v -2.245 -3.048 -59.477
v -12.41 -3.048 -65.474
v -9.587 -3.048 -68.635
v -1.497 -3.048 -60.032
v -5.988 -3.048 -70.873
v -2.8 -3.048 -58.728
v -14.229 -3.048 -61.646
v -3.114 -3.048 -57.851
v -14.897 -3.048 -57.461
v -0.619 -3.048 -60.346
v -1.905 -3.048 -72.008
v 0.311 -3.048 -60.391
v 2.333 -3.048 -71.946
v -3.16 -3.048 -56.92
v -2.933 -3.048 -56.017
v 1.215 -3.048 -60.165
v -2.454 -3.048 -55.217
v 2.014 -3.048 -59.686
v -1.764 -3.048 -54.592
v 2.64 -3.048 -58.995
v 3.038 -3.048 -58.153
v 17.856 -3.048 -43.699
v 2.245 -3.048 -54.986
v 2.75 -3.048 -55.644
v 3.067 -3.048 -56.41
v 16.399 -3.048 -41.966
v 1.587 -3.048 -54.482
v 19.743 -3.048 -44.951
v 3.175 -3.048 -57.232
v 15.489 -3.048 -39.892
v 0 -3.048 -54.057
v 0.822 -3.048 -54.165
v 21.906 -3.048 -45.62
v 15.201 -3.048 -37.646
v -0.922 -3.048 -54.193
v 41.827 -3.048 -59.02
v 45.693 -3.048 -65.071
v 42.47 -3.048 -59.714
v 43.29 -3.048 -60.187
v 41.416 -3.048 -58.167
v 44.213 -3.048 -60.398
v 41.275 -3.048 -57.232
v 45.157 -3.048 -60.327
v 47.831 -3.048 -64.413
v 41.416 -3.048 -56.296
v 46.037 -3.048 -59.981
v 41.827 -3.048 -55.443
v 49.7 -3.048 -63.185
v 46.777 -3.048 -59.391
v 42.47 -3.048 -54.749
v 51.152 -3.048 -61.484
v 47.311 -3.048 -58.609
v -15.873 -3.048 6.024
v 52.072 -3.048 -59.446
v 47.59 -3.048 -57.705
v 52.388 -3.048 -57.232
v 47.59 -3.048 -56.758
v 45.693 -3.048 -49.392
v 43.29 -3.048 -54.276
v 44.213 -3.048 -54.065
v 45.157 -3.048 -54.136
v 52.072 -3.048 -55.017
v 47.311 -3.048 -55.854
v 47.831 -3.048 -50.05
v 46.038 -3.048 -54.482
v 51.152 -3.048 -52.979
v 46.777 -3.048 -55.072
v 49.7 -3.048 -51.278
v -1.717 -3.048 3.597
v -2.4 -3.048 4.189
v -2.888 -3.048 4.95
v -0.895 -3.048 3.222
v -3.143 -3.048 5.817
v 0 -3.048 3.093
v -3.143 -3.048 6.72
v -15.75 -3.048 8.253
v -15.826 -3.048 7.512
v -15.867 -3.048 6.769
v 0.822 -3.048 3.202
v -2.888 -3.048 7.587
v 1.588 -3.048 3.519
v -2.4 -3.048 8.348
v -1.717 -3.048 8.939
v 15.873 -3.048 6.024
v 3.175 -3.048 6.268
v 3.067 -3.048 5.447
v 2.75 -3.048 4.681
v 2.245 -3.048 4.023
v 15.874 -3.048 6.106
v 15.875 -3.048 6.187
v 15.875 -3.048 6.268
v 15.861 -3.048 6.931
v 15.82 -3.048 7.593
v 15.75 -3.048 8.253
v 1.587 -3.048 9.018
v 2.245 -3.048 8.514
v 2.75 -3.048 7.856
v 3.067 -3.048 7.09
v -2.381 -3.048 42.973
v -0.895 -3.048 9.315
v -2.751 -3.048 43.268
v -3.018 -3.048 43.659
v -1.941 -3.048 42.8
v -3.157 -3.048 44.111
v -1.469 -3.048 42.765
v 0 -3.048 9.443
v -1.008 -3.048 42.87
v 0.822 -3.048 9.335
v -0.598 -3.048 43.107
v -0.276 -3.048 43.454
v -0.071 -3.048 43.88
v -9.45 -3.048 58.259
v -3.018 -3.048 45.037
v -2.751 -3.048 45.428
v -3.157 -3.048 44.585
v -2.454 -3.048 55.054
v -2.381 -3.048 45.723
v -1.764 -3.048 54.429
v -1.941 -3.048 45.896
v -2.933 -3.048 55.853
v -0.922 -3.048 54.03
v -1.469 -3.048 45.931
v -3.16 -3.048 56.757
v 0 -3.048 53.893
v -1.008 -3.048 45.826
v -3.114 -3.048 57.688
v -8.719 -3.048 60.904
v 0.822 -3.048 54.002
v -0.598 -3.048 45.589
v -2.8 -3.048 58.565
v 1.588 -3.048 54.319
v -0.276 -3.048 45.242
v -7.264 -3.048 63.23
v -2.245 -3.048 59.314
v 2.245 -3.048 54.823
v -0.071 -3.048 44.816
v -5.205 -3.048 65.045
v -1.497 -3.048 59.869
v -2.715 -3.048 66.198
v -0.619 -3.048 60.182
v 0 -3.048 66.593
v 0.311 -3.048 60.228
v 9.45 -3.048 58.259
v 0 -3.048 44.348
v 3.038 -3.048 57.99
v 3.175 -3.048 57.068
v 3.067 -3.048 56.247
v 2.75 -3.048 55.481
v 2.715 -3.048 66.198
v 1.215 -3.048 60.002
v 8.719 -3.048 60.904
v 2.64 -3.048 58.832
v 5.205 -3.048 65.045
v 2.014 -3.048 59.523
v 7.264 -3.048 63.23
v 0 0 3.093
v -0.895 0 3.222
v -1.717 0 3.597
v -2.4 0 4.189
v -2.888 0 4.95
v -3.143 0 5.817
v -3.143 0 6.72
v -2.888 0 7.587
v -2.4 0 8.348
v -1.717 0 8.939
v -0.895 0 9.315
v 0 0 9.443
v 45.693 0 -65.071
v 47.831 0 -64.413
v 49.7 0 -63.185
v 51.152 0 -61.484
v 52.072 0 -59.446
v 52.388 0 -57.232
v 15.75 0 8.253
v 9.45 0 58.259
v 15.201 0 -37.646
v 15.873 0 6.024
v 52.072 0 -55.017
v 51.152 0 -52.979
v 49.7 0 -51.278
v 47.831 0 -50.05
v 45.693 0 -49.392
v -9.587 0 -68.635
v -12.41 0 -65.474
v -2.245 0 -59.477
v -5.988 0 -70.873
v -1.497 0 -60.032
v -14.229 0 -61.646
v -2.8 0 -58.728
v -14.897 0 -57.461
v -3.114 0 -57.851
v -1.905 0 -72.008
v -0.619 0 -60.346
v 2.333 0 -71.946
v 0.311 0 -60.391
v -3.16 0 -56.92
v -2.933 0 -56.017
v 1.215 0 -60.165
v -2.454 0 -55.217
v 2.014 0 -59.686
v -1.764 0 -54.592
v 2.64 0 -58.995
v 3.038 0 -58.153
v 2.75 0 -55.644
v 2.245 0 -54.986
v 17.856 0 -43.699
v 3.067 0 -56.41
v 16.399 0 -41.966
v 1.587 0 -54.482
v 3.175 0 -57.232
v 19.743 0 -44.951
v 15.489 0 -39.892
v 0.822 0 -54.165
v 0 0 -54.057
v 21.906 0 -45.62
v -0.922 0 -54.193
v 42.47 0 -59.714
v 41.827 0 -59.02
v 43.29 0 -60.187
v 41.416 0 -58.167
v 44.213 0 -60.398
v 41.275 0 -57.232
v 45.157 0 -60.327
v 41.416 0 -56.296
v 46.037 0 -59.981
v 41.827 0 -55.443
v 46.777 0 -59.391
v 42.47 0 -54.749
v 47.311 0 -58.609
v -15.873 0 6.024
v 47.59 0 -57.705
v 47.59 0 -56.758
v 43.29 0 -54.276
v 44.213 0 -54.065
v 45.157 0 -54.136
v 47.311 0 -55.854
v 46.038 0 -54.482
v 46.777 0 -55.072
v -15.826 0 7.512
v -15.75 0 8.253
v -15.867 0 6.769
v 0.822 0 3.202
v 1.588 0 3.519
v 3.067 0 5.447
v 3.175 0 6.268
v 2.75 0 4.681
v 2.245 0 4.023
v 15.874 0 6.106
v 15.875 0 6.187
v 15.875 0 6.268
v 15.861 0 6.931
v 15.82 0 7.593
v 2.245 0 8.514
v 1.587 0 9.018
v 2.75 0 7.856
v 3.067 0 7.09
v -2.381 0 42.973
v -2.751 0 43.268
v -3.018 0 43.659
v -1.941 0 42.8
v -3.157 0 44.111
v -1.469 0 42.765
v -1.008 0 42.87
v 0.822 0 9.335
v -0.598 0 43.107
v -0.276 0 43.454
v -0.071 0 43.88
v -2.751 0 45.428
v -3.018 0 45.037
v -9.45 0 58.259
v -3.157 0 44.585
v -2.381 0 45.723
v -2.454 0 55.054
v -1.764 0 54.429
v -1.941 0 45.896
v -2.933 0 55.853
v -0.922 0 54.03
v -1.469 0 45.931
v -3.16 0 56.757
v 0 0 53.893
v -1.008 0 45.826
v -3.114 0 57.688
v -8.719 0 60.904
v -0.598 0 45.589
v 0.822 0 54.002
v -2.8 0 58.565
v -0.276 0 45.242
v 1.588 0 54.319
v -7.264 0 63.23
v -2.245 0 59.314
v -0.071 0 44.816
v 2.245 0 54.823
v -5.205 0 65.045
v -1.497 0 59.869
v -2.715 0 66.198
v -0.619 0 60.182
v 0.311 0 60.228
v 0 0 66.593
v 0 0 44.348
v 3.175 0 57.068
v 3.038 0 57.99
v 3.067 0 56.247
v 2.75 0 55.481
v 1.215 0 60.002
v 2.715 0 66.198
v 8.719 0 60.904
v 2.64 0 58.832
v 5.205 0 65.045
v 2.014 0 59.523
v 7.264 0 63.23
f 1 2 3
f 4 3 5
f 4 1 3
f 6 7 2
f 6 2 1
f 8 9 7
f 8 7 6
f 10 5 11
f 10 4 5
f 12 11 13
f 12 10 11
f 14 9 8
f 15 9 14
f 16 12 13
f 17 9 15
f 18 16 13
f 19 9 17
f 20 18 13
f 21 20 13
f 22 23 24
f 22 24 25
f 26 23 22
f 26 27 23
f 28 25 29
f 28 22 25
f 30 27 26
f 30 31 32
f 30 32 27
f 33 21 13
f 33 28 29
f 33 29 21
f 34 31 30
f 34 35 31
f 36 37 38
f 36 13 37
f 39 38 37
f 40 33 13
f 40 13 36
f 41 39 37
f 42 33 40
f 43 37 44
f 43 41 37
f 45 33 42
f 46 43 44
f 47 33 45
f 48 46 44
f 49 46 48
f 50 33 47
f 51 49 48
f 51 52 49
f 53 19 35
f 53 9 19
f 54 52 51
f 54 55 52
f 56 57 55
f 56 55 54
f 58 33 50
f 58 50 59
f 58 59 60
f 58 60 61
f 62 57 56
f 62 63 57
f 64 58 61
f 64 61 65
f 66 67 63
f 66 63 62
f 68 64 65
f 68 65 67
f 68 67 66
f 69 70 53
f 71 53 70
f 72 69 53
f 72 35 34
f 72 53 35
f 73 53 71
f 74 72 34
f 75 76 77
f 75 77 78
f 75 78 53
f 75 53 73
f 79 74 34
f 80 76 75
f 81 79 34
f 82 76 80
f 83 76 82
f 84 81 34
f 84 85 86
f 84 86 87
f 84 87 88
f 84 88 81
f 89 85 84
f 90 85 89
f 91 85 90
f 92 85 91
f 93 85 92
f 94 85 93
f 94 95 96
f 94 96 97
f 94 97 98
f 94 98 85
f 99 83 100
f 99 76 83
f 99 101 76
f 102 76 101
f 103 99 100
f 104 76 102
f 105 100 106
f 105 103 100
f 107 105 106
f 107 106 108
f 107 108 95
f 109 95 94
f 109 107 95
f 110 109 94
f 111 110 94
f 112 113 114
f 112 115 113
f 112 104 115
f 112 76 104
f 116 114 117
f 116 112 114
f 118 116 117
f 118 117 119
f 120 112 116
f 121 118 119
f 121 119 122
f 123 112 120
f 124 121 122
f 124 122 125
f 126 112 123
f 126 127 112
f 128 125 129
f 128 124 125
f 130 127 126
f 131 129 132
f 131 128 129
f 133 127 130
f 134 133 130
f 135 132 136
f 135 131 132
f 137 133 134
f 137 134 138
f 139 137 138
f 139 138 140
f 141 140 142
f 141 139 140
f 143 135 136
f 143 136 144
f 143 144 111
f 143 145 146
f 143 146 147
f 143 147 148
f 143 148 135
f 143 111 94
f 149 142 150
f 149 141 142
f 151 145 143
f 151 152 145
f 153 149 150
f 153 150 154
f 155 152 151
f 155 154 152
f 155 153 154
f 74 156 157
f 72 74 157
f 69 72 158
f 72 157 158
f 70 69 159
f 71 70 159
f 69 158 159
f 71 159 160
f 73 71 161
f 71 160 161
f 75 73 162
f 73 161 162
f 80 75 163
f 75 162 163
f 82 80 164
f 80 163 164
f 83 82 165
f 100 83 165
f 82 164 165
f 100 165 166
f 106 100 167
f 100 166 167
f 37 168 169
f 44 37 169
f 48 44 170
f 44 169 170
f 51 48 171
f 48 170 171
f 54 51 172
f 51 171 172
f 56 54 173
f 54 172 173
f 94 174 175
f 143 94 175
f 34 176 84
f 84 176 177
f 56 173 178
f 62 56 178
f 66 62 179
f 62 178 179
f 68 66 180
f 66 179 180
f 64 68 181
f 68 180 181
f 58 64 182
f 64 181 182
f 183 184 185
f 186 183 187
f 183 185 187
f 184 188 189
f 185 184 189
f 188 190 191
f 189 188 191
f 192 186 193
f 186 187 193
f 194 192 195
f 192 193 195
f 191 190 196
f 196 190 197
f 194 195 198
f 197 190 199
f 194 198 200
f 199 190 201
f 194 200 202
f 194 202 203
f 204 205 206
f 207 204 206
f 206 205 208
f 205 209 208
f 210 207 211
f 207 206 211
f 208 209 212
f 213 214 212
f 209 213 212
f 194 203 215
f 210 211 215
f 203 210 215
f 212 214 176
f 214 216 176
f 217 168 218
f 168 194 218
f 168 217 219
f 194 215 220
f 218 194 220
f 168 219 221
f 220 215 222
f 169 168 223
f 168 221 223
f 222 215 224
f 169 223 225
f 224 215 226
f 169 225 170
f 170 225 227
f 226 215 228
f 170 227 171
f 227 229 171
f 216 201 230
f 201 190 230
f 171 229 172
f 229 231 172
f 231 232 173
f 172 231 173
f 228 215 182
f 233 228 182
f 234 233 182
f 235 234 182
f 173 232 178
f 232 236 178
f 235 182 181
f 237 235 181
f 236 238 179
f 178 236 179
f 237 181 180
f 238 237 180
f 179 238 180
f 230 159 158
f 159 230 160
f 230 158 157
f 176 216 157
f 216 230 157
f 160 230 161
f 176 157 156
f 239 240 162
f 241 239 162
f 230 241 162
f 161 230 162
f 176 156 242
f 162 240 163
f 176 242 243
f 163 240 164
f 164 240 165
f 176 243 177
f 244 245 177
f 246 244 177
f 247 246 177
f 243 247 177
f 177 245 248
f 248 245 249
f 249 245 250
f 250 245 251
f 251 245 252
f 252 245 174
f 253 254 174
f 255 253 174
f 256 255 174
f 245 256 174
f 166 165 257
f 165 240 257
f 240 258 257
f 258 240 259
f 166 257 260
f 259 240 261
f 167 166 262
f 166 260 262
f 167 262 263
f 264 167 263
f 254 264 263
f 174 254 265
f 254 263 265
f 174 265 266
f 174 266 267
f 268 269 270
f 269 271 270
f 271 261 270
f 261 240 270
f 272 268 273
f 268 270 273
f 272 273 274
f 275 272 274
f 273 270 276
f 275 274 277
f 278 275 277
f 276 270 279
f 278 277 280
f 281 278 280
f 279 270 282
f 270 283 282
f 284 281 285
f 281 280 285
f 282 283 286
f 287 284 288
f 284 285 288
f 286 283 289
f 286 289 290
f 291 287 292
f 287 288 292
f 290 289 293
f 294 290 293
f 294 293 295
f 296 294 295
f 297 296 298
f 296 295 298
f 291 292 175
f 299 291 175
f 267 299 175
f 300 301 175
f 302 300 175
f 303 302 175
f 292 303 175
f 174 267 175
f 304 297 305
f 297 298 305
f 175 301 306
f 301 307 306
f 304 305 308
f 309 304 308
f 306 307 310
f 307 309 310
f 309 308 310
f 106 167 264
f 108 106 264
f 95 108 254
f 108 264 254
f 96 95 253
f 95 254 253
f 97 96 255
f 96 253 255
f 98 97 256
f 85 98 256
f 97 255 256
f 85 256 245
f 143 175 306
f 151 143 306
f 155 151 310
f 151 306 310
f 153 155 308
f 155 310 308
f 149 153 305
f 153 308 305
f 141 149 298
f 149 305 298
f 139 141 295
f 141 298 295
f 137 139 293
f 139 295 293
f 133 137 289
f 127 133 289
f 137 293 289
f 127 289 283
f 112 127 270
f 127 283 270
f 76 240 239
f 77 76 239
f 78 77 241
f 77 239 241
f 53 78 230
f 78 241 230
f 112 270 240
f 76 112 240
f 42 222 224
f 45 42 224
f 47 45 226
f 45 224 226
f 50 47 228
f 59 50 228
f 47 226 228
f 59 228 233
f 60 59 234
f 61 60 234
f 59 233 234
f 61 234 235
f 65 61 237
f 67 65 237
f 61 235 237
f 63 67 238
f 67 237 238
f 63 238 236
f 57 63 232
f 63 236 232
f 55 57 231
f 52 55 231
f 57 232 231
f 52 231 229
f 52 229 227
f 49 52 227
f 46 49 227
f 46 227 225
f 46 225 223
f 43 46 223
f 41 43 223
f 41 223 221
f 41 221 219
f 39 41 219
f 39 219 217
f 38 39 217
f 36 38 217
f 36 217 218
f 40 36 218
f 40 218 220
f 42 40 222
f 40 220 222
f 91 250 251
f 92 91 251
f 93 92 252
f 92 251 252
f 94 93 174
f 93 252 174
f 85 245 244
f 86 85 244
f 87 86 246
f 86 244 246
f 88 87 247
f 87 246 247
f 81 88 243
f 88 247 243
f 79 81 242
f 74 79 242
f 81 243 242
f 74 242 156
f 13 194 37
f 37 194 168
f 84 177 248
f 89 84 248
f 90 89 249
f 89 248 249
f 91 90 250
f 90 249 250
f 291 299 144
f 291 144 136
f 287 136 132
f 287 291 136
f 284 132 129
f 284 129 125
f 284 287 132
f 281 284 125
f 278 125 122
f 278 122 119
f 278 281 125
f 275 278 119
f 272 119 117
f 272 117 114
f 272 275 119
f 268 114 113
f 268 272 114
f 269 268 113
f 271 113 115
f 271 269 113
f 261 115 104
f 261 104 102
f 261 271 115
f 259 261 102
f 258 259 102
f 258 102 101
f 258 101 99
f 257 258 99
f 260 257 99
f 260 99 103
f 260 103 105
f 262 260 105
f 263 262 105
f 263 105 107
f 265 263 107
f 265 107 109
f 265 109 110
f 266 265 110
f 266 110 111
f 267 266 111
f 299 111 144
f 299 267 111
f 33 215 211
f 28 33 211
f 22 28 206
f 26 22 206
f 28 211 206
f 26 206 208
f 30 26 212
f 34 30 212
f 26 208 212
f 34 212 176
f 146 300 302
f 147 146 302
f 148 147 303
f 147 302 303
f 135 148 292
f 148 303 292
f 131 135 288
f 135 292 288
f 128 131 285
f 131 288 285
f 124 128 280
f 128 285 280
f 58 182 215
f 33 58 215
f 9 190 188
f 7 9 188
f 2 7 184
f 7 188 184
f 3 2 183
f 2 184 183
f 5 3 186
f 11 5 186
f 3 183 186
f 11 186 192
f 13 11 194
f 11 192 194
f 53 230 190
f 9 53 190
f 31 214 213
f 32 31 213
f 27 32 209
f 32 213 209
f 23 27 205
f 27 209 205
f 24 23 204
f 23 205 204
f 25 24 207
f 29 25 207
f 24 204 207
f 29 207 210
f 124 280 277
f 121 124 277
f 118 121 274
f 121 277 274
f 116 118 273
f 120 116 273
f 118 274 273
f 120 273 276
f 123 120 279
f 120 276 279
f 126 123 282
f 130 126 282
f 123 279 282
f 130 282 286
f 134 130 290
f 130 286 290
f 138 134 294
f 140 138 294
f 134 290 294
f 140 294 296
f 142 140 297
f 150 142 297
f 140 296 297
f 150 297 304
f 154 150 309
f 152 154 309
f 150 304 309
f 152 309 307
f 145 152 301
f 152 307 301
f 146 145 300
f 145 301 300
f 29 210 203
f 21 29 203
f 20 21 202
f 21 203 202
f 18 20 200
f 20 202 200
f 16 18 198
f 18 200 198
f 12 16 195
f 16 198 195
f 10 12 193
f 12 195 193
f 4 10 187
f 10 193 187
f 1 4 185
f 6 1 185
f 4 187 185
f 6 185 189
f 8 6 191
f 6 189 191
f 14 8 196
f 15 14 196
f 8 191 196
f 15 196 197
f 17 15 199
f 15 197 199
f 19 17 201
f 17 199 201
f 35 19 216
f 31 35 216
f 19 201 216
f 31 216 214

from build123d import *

# Parameters (mm, degrees)
F0_R     = 1.5875
F1_DEPTH = 3.048


# Not quite as in the source:
# - a feature names something its author has since deleted; it is built from what else it names


with BuildPart() as f1:
    # F0 (on Front) → F1 (new body)
    with BuildSketch(Plane.XZ):
        with BuildLine():
            Line((0, 3.0934604908), (0, 0))
            Line((0, 0), (0, -9.6065395092))
            ThreePointArc((0, -9.6065395092), (11.1386616751, -5.0428542466), (15.8731222627, 6.024299409))
            ThreePointArc((15.8731222627, 6.024299409), (15.8745305587, 6.1463763397), (15.875, 6.2684604908))
            ThreePointArc((15.875, 6.2684604908), (15.8438414904, 7.2625992274), (15.7504882737, 8.2528354908))
            ThreePointArc((15.7504882737, 8.2528354908), (10.5003255158, 18.1747104908), (0, 22.1434604908))
            Line((0, 22.1434604908), (0, 9.4434604908))
            ThreePointArc((0, 9.4434604908), (2.2450640303, 8.513524521), (3.175, 6.2684604908))
            ThreePointArc((3.175, 6.2684604908), (2.2450640303, 4.0233964605), (0, 3.0934604908))
        make_face()
        with BuildLine():
            Line((0, -9.6065395092), (0, 0))
            Line((0, 0), (0, 3.0934604908))
            ThreePointArc((0, 3.0934604908), (-3.175, 6.2684604908), (0, 9.4434604908))
            Line((0, 9.4434604908), (0, 22.1434604908))
            ThreePointArc((0, 22.1434604908), (-10.5003255158, 18.1747104908), (-15.7504882737, 8.2528354908))
            ThreePointArc((-15.7504882737, 8.2528354908), (-15.8510182356, 7.1407252981), (-15.8731222627, 6.024299409))
            ThreePointArc((-15.8731222627, 6.024299409), (-11.1386616751, -5.0428542466), (0, -9.6065395092))
        make_face()
        with BuildLine():
            ThreePointArc((15.8731222627, 6.024299409), (11.1386616751, -5.0428542466), (0, -9.6065395092))
            Line((0, -9.6065395092), (0, -42.3331838364))
            ThreePointArc((0, -42.3331838364), (10.5347283248, -46.6968111845), (14.8983556728, -57.2315395092))
            Line((14.8983556728, -57.2315395092), (36.5125, -57.2315395092))
            ThreePointArc((36.5125, -57.2315395092), (39.2955109449, -51.1953860295), (45.6930099416, -49.3919711196))
            Line((45.6930099416, -49.3919711196), (21.9056452954, -45.6203437456))
            ThreePointArc((21.9056452954, -45.6203437456), (17.0653083108, -42.8843212703), (15.2013844237, -37.6459561768))
            Line((15.2013844237, -37.6459561768), (15.8731222627, 6.024299409))
        make_face()
        with BuildLine():
            Line((0, -42.3331838364), (0, -9.6065395092))
            ThreePointArc((0, -9.6065395092), (-11.1386616751, -5.0428542466), (-15.8731222627, 6.024299409))
            Line((-15.8731222627, 6.024299409), (-14.8965934556, -57.4606795809))
            ThreePointArc((-14.8965934556, -57.4606795809), (-10.6154324462, -46.778138353), (0, -42.3331838364))
        make_face()
        with BuildLine():
            ThreePointArc((14.8983556728, -57.2315395092), (10.5347283248, -46.6968111845), (0, -42.3331838364))
            Line((0, -42.3331838364), (0, -54.0565395092))
            ThreePointArc((0, -54.0565395092), (2.2450640303, -54.986475479), (3.175, -57.2315395092))
            Line((3.175, -57.2315395092), (14.8983556728, -57.2315395092))
        make_face()
        with BuildLine():
            Line((0, -54.0565395092), (0, -42.3331838364))
            ThreePointArc((0, -42.3331838364), (-10.6154324462, -46.778138353), (-14.8965934556, -57.4606795809))
            ThreePointArc((-14.8965934556, -57.4606795809), (-9.5873458416, -68.6352144199), (2.3330776963, -71.9460816433))
            ThreePointArc((2.3330776963, -71.9460816433), (11.32960774, -66.9062999823), (14.8983556728, -57.2315395092))
            Line((14.8983556728, -57.2315395092), (3.175, -57.2315395092))
            ThreePointArc((3.175, -57.2315395092), (-2.2450640303, -59.4766035395), (0, -54.0565395092))
        make_face()
        with BuildLine():
            Line((36.5125, -57.2315395092), (14.8983556728, -57.2315395092))
            ThreePointArc((14.8983556728, -57.2315395092), (11.32960774, -66.9062999823), (2.3330776963, -71.9460816433))
            Line((2.3330776963, -71.9460816433), (45.6930099416, -65.0711078988))
            ThreePointArc((45.6930099416, -65.0711078988), (39.2955109449, -63.2676929889), (36.5125, -57.2315395092))
        make_face()
        with BuildLine():
            Line((-9.4502929642, 58.2590854908), (-15.7504882737, 8.2528354908))
            ThreePointArc((-15.7504882737, 8.2528354908), (-10.5003255158, 18.1747104908), (0, 22.1434604908))
            Line((0, 22.1434604908), (0, 44.3480842421))
            Line((0, 44.3480842421), (0, 47.5434604908))
            ThreePointArc((0, 47.5434604908), (-7.14375, 50.7682651813), (-9.4502929642, 58.2590854908))
        make_face()
        with Locations((-1.5875, 44.3480842421)):
            Circle(F0_R, mode=Mode.SUBTRACT)
        with BuildLine():
            Line((0, 44.3480842421), (0, 22.1434604908))
            ThreePointArc((0, 22.1434604908), (10.5003255158, 18.1747104908), (15.7504882737, 8.2528354908))
            Line((15.7504882737, 8.2528354908), (9.4502929642, 58.2590854908))
            ThreePointArc((9.4502929642, 58.2590854908), (9.5063048942, 57.6649437327), (9.525, 57.0684604908))
            ThreePointArc((9.525, 57.0684604908), (6.7351920908, 50.3332684), (0, 47.5434604908))
            Line((0, 47.5434604908), (0, 44.3480842421))
        make_face()
        with BuildLine():
            ThreePointArc((45.6930099416, -49.3919711196), (39.2955109449, -51.1953860295), (36.5125, -57.2315395092))
            ThreePointArc((36.5125, -57.2315395092), (39.2955109449, -63.2676929889), (45.6930099416, -65.0711078988))
            ThreePointArc((45.6930099416, -65.0711078988), (50.4861534797, -62.3860285644), (52.3875, -57.2315395092))
            ThreePointArc((52.3875, -57.2315395092), (50.4861534797, -52.0770504541), (45.6930099416, -49.3919711196))
        make_face()
        with BuildLine():
            ThreePointArc((47.625, -57.2315395092), (44.45, -60.4065395092), (41.275, -57.2315395092))
            ThreePointArc((41.275, -57.2315395092), (44.45, -54.0565395092), (47.625, -57.2315395092))
        make_face(mode=Mode.SUBTRACT)
        with BuildLine():
            ThreePointArc((9.4502929642, 58.2590854908), (0, 66.5934604908), (-9.4502929642, 58.2590854908))
            ThreePointArc((-9.4502929642, 58.2590854908), (-7.14375, 50.7682651813), (0, 47.5434604908))
            ThreePointArc((0, 47.5434604908), (6.7351920908, 50.3332684), (9.525, 57.0684604908))
            ThreePointArc((9.525, 57.0684604908), (9.5063048942, 57.6649437327), (9.4502929642, 58.2590854908))
        make_face()
        with BuildLine():
            ThreePointArc((3.175, 57.0684604908), (2.2450640303, 54.8233964605), (0, 53.8934604908))
            ThreePointArc((0, 53.8934604908), (-2.2450640303, 59.313524521), (3.175, 57.0684604908))
        make_face(mode=Mode.SUBTRACT)
    extrude(amount=F1_DEPTH)


solid = f1.part
